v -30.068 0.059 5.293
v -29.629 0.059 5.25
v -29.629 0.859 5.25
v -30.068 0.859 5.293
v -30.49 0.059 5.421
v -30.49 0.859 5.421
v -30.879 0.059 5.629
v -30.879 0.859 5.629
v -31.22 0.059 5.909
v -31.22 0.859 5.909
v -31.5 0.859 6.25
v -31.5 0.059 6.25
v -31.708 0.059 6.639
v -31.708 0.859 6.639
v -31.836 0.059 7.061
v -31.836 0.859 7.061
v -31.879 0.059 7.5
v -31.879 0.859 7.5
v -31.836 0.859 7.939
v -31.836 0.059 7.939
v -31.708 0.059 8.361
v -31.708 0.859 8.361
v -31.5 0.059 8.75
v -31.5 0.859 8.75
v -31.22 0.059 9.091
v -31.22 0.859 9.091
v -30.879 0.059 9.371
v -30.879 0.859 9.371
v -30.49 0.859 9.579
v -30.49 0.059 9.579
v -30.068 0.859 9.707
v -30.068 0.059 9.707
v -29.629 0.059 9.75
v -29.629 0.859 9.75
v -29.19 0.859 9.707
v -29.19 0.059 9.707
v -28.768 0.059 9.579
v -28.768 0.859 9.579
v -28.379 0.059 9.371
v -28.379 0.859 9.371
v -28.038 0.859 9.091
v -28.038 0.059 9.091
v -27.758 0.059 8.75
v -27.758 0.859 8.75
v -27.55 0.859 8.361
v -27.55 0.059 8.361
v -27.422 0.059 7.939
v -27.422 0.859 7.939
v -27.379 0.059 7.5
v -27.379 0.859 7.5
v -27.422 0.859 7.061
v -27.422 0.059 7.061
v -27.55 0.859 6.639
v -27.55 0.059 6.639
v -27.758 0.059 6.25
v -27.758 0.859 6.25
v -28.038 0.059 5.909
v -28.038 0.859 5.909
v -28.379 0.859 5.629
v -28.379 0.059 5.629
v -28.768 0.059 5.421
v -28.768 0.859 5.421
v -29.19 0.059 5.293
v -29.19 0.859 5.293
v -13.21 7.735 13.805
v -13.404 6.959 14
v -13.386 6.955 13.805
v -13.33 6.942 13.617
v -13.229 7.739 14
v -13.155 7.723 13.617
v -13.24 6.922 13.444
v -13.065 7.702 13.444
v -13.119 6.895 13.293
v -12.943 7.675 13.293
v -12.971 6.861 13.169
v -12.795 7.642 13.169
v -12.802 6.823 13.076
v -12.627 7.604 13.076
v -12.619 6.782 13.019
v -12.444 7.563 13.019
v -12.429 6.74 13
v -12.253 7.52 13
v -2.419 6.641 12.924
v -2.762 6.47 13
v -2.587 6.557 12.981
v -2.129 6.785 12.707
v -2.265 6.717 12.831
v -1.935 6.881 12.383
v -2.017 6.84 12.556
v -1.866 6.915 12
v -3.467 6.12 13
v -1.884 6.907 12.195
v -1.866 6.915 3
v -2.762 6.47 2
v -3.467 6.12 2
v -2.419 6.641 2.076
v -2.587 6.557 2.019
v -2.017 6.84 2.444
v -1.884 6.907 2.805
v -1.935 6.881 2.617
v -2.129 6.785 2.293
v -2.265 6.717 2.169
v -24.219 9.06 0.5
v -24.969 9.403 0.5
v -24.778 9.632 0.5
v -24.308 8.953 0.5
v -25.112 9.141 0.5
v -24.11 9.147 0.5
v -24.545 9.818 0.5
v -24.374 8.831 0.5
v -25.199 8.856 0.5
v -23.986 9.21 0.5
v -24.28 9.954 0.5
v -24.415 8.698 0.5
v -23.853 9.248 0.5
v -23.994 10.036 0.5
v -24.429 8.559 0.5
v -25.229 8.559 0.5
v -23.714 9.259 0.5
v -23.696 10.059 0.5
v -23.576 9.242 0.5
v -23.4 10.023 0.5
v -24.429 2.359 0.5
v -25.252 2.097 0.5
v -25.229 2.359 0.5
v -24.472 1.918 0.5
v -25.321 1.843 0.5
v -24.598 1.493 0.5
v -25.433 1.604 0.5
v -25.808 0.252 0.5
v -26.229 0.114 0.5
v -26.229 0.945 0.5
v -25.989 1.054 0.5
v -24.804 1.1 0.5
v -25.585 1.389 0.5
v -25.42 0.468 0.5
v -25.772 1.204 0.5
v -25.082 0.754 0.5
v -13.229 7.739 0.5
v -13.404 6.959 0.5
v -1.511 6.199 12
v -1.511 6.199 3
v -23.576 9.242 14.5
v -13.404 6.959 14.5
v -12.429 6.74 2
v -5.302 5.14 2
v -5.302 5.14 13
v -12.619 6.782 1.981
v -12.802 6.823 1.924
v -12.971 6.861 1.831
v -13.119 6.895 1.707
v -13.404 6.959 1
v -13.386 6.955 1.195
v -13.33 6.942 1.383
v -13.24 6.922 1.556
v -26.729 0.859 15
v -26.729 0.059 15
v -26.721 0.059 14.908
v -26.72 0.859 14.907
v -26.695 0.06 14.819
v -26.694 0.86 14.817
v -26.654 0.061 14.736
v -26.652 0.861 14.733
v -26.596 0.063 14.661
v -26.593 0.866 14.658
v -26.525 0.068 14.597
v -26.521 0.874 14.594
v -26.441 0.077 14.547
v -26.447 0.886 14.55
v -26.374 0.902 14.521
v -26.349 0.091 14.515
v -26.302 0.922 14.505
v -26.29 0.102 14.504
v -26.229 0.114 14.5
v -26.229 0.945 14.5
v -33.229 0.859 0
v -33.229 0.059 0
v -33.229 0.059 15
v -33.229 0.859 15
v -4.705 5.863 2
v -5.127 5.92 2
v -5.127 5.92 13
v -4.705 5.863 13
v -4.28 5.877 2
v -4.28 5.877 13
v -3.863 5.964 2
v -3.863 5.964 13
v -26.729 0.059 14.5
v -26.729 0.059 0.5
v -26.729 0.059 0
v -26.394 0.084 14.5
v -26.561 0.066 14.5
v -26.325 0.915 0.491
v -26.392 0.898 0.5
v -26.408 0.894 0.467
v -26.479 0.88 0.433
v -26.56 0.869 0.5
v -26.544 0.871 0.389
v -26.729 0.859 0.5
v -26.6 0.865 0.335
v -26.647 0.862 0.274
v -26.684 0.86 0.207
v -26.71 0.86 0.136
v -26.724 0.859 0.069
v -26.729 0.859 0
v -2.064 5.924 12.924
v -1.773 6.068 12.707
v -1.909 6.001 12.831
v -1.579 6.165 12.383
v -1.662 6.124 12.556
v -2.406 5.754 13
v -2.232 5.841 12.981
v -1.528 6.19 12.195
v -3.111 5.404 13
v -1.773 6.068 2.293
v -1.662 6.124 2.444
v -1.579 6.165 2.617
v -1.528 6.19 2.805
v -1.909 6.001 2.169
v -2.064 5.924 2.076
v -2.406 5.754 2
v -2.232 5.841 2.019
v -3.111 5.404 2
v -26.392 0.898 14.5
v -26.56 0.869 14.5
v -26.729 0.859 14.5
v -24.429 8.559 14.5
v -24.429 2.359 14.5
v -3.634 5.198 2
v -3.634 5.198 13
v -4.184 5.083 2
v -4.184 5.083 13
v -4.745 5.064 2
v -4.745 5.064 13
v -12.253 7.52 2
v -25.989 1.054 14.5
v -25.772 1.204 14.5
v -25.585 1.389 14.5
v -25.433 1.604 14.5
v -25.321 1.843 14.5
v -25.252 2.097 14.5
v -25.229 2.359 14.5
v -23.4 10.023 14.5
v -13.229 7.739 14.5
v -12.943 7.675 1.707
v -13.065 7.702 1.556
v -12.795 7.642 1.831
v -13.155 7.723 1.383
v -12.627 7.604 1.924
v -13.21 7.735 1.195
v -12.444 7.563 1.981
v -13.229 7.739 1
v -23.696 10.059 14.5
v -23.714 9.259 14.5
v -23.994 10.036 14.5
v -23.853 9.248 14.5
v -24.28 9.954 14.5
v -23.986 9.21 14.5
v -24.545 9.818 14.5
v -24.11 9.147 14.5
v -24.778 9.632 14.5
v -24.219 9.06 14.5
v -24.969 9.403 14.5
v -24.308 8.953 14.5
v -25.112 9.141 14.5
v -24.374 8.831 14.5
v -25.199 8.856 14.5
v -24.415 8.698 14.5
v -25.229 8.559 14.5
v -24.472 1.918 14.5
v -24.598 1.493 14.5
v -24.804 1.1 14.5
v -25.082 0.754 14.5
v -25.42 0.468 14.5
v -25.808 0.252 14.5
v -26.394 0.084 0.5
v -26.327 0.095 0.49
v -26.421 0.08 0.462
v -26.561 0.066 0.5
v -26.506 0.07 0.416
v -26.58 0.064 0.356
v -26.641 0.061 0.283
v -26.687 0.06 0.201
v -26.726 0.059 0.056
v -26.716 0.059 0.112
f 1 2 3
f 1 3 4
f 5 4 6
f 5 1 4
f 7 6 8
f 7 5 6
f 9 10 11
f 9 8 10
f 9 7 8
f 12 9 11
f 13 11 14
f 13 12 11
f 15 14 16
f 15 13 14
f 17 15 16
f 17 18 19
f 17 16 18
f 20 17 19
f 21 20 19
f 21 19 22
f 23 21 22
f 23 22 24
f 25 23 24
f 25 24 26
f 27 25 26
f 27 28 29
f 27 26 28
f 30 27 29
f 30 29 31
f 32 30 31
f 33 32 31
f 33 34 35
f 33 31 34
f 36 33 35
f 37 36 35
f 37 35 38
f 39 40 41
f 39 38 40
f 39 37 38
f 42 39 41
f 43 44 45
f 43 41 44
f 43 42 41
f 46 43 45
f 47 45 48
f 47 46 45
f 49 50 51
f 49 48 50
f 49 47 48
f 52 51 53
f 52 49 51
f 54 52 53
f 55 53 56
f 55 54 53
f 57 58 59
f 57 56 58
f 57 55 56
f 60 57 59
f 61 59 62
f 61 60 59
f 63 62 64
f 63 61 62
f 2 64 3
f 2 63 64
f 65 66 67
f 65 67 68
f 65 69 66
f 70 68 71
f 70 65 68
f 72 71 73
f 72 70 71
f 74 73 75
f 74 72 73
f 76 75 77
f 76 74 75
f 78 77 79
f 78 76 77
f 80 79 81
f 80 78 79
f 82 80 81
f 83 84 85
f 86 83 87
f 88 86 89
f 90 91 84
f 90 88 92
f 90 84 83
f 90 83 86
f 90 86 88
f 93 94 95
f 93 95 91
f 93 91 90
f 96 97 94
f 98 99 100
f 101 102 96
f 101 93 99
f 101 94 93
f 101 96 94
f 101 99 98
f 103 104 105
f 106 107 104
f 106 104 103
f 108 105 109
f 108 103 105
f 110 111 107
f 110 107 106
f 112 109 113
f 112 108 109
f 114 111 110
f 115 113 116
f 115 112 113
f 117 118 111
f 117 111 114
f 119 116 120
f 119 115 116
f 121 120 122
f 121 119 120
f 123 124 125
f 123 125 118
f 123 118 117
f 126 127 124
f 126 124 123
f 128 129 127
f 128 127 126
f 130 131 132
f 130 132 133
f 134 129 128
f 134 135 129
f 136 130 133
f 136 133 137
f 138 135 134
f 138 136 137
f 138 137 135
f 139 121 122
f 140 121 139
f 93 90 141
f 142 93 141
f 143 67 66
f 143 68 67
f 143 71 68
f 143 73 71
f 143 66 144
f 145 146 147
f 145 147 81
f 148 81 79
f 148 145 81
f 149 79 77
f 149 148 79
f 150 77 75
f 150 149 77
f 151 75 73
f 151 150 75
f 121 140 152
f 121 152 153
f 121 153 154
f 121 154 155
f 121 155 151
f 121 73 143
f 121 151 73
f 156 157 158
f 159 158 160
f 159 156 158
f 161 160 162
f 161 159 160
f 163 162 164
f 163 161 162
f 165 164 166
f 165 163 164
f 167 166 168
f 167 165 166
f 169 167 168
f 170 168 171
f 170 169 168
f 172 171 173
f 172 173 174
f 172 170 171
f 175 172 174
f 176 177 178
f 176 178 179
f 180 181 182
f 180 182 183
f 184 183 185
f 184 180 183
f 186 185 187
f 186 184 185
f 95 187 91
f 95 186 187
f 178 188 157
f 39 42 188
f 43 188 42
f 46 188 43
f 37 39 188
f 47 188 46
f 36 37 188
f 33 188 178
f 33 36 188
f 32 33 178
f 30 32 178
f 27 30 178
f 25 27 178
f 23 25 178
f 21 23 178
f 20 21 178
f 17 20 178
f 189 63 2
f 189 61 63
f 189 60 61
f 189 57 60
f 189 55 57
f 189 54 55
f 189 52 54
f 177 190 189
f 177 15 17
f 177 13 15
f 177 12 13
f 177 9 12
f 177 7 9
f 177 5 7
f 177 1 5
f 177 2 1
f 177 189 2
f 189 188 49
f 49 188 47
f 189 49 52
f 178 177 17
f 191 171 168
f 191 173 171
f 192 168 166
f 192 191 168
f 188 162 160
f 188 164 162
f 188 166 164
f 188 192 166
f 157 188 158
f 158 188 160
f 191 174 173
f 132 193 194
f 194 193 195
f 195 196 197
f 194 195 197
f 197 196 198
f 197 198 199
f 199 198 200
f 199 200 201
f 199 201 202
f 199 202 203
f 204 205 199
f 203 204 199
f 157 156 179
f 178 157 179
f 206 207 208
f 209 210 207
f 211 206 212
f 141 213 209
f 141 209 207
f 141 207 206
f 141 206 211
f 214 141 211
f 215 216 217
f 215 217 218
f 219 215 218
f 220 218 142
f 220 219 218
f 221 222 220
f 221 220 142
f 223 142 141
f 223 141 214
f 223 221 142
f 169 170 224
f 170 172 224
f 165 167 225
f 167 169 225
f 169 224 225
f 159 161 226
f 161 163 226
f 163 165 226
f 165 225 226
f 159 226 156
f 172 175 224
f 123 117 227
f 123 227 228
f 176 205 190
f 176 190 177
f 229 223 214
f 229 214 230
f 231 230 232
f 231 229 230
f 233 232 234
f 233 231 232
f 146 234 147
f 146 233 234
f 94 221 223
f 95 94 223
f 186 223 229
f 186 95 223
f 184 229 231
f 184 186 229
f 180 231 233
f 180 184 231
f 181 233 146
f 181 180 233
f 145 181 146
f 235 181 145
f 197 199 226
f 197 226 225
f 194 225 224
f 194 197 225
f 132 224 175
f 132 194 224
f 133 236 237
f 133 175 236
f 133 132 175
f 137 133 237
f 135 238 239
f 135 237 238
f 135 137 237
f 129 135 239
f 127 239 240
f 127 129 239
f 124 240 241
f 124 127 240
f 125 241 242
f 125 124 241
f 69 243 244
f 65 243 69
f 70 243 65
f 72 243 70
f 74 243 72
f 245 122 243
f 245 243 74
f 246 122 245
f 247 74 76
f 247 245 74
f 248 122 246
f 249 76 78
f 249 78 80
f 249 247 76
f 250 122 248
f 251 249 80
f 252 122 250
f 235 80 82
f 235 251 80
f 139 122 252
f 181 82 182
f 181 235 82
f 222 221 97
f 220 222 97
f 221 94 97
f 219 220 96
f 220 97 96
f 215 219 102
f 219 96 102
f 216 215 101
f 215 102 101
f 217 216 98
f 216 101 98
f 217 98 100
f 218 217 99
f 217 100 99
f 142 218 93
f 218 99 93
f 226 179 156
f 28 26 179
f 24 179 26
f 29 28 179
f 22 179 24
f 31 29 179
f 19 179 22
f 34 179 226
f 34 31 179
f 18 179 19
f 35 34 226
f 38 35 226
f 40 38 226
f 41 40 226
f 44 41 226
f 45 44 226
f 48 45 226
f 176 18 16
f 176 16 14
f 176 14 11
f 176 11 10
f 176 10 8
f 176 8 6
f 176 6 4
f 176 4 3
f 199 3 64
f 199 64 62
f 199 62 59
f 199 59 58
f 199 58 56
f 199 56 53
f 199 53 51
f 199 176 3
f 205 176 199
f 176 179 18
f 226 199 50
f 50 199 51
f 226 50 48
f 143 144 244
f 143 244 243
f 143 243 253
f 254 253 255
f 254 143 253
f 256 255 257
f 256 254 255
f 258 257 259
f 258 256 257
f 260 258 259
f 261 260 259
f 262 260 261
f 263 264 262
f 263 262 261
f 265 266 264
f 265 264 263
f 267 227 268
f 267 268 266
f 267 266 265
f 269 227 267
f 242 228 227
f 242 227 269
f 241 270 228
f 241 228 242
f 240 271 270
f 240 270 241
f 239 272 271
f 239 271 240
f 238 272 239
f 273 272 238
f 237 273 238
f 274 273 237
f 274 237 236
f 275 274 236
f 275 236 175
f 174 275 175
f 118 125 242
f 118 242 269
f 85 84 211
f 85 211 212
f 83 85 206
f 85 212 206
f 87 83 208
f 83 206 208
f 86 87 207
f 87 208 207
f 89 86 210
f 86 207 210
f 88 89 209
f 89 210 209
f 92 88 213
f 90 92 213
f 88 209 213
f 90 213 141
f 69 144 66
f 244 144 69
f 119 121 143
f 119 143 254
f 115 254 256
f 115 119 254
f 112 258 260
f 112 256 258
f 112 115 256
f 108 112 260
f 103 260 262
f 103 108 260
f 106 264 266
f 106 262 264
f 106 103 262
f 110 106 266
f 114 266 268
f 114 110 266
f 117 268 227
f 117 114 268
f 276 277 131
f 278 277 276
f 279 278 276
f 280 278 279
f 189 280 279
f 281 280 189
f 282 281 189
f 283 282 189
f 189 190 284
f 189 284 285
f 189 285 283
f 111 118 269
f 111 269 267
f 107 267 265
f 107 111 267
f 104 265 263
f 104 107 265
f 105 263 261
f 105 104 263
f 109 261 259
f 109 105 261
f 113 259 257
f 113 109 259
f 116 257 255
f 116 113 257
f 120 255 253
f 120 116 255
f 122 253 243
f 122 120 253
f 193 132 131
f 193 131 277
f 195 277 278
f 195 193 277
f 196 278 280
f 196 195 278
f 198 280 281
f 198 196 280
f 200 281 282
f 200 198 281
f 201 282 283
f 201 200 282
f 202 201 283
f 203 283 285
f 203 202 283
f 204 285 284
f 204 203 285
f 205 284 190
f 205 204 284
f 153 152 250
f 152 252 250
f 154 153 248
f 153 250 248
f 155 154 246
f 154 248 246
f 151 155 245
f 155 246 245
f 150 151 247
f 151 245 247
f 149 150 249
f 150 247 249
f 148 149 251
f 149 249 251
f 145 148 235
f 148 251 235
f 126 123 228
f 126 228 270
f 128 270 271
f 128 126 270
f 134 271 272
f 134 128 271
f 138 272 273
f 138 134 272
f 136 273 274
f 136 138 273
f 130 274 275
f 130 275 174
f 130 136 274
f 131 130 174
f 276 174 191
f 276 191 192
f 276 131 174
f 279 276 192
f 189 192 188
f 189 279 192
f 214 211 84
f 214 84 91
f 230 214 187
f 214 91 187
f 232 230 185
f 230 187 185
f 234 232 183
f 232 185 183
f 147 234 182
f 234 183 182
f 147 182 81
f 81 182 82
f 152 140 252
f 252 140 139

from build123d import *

# Parameters (mm, degrees)
EXTRUDE_1_DEPTH          = 15
CUT_EXTRUDE_1_DEPTH      = 15
CUT_EXTRUDE_1_DEPTH_BACK = 15
SKETCH_2_R               = 2.25
CUT_EXTRUDE_2_DEPTH      = 1.5
CUT_EXTRUDE_3_DEPTH      = 1.5
FILLET_1_R               = 0.5
FILLET_2_R               = 1


with BuildPart() as part:
    # Эскиз1 → Вытянуть1 (new body)
    with BuildSketch(Plane.XY):
        with BuildLine():
            Line((-25.229060352, 2.359412), (-25.229060352, 8.559412))
            ThreePointArc((-25.229060352, 8.559412), (-24.666370719, 9.730500928), (-23.400461317, 10.022977057))
            Line((-23.400461317, 10.022977057), (-5.12659913, 5.920136906))
            ThreePointArc((-5.12659913, 5.920136906), (-4.279542261, 5.877403833), (-3.466943303, 6.120332607))
            Line((-3.466943303, 6.120332607), (-1.866464924, 6.915175876))
            Line((-1.866464924, 6.915175876), (-1.510627877, 6.19867047))
            Line((-1.510627877, 6.19867047), (-3.111106257, 5.403827201))
            ThreePointArc((-3.111106257, 5.403827201), (-4.183736881, 5.083161219), (-5.301851949, 5.139568876))
            Line((-5.301851949, 5.139568876), (-23.575714136, 9.242409026))
            ThreePointArc((-23.575714136, 9.242409026), (-24.166471856, 9.105920166), (-24.429060352, 8.559412))
            Line((-24.429060352, 8.559412), (-24.429060352, 2.359412))
            ThreePointArc((-24.429060352, 2.359412), (-25.102714755, 0.733066403), (-26.729060352, 0.059412))
            Line((-26.729060352, 0.059412), (-33.229060352, 0.059412))
            Line((-33.229060352, 0.059412), (-33.229060352, 0.859412))
            Line((-33.229060352, 0.859412), (-26.729060352, 0.859412))
            ThreePointArc((-26.729060352, 0.859412), (-25.66840018, 1.298751828), (-25.229060352, 2.359412))
        make_face()
    extrude(amount=EXTRUDE_1_DEPTH)

    # Эскиз2 → Вырез-Вытянуть1 (cut, two sides: drawn at the far end of the back side and taken through both)
    with BuildSketch(Plane(origin=(0, 0.859412, 0), x_dir=(1, 0, 0), z_dir=(0, 1, 0)).offset(-CUT_EXTRUDE_1_DEPTH_BACK)):
        with Locations(Location((-29.629060352, -7.5, 0), (0, 0, 90))):
            Circle(SKETCH_2_R)
        Polygon((-13.229060352, -0.5), (-13.229060352, -2), (-0.791842207, -2), (-0.791842207, 0), (-26.729060352, 0), (-26.729060352, -0.5), align=None)
        Polygon((-26.729060352, -15), (-0.791842207, -15), (-0.791842207, -13), (-13.229060352, -13), (-13.229060352, -14.5), (-26.729060352, -14.5), align=None)
    extrude(amount=CUT_EXTRUDE_1_DEPTH + CUT_EXTRUDE_1_DEPTH_BACK, mode=Mode.SUBTRACT)

    # Эскиз3 → Вырез-Вытянуть2 (cut)
    with BuildSketch(Plane.XY.offset(14.5)):
        Polygon((-13.229060352, 7.739298224), (-13.229060352, 6.919382502), (-13.40431317, 6.958730194), align=None)
    extrude(amount=-CUT_EXTRUDE_2_DEPTH, mode=Mode.SUBTRACT)

    # Эскиз4 → Вырез-Вытянуть3 (cut)
    with BuildSketch(Plane(origin=(0, 0, 0.5), x_dir=(-1, 0, 0), z_dir=(0, 0, -1))):
        Polygon((13.229060352, 7.739298224), (13.229060352, 6.919382502), (13.40431317, 6.958730194), align=None)
    extrude(amount=-CUT_EXTRUDE_3_DEPTH, mode=Mode.SUBTRACT)

    # Скругление1
    # the kernel refuses this fillet: 0.5 mm, written as the material it adds along each edge
    with BuildSketch(Plane(origin=(-26.729060352, 2.109412, 14.5), x_dir=(0, 0, 1), z_dir=(0, -1, 0))) as fillet_1_piece_1_section:
        with BuildLine():
            CenterArc((FILLET_1_R, -FILLET_1_R), FILLET_1_R, 90, 90)
            Line((0, -FILLET_1_R), (0, 0))
            Line((0, 0), (FILLET_1_R, 0))
        make_face()
    fillet_1_piece_1 = extrude(amount=3.3, mode=Mode.PRIVATE)
    fillet_1_piece_1 = fillet_1_piece_1 - Plane(origin=(-26.729060352, 2.359412, 14.543282734), x_dir=(0, -1, 0), z_dir=(0, 0, -1)) * Cylinder(1.5, 9, mode=Mode.PRIVATE)
    fillet_1_piece_1 = fillet_1_piece_1 & Plane(origin=(-26.729060352, 2.359412, 14.543282734), x_dir=(1, 0, 0), z_dir=(0, 0, -1)) * Cylinder(2.3, 9, mode=Mode.PRIVATE)
    add(fillet_1_piece_1)
    with BuildSketch(Plane(origin=(-26.729060352, 2.109412, 0.5), x_dir=(0, 0, -1), z_dir=(0, -1, 0))) as fillet_1_piece_2_section:
        with BuildLine():
            CenterArc((FILLET_1_R, FILLET_1_R), FILLET_1_R, 180, 90)
            Line((0, FILLET_1_R), (0, 0))
            Line((0, 0), (FILLET_1_R, 0))
        make_face()
    fillet_1_piece_2 = extrude(amount=3.3, mode=Mode.PRIVATE)
    fillet_1_piece_2 = fillet_1_piece_2 - Plane(origin=(-26.729060352, 2.359412, 0.456717266), x_dir=(0, -1, 0), z_dir=(0, 0, -1)) * Cylinder(1.5, 9, mode=Mode.PRIVATE)
    fillet_1_piece_2 = fillet_1_piece_2 & Plane(origin=(-26.729060352, 2.359412, 0.456717266), x_dir=(1, 0, 0), z_dir=(0, 0, -1)) * Cylinder(2.3, 9, mode=Mode.PRIVATE)
    add(fillet_1_piece_2)

    # Скругление2
    fillet_2_edges = [part.edges().sort_by_distance(p)[0] for p in [
        (-1.6885464, 6.556923173, 13),
        (-13.316686761, 7.349014209, 13),
        (-13.316686761, 7.349014209, 2),
        (-1.6885464, 6.556923173, 2),
    ]]
    fillet(fillet_2_edges, radius=FILLET_2_R)


solid = part.part
